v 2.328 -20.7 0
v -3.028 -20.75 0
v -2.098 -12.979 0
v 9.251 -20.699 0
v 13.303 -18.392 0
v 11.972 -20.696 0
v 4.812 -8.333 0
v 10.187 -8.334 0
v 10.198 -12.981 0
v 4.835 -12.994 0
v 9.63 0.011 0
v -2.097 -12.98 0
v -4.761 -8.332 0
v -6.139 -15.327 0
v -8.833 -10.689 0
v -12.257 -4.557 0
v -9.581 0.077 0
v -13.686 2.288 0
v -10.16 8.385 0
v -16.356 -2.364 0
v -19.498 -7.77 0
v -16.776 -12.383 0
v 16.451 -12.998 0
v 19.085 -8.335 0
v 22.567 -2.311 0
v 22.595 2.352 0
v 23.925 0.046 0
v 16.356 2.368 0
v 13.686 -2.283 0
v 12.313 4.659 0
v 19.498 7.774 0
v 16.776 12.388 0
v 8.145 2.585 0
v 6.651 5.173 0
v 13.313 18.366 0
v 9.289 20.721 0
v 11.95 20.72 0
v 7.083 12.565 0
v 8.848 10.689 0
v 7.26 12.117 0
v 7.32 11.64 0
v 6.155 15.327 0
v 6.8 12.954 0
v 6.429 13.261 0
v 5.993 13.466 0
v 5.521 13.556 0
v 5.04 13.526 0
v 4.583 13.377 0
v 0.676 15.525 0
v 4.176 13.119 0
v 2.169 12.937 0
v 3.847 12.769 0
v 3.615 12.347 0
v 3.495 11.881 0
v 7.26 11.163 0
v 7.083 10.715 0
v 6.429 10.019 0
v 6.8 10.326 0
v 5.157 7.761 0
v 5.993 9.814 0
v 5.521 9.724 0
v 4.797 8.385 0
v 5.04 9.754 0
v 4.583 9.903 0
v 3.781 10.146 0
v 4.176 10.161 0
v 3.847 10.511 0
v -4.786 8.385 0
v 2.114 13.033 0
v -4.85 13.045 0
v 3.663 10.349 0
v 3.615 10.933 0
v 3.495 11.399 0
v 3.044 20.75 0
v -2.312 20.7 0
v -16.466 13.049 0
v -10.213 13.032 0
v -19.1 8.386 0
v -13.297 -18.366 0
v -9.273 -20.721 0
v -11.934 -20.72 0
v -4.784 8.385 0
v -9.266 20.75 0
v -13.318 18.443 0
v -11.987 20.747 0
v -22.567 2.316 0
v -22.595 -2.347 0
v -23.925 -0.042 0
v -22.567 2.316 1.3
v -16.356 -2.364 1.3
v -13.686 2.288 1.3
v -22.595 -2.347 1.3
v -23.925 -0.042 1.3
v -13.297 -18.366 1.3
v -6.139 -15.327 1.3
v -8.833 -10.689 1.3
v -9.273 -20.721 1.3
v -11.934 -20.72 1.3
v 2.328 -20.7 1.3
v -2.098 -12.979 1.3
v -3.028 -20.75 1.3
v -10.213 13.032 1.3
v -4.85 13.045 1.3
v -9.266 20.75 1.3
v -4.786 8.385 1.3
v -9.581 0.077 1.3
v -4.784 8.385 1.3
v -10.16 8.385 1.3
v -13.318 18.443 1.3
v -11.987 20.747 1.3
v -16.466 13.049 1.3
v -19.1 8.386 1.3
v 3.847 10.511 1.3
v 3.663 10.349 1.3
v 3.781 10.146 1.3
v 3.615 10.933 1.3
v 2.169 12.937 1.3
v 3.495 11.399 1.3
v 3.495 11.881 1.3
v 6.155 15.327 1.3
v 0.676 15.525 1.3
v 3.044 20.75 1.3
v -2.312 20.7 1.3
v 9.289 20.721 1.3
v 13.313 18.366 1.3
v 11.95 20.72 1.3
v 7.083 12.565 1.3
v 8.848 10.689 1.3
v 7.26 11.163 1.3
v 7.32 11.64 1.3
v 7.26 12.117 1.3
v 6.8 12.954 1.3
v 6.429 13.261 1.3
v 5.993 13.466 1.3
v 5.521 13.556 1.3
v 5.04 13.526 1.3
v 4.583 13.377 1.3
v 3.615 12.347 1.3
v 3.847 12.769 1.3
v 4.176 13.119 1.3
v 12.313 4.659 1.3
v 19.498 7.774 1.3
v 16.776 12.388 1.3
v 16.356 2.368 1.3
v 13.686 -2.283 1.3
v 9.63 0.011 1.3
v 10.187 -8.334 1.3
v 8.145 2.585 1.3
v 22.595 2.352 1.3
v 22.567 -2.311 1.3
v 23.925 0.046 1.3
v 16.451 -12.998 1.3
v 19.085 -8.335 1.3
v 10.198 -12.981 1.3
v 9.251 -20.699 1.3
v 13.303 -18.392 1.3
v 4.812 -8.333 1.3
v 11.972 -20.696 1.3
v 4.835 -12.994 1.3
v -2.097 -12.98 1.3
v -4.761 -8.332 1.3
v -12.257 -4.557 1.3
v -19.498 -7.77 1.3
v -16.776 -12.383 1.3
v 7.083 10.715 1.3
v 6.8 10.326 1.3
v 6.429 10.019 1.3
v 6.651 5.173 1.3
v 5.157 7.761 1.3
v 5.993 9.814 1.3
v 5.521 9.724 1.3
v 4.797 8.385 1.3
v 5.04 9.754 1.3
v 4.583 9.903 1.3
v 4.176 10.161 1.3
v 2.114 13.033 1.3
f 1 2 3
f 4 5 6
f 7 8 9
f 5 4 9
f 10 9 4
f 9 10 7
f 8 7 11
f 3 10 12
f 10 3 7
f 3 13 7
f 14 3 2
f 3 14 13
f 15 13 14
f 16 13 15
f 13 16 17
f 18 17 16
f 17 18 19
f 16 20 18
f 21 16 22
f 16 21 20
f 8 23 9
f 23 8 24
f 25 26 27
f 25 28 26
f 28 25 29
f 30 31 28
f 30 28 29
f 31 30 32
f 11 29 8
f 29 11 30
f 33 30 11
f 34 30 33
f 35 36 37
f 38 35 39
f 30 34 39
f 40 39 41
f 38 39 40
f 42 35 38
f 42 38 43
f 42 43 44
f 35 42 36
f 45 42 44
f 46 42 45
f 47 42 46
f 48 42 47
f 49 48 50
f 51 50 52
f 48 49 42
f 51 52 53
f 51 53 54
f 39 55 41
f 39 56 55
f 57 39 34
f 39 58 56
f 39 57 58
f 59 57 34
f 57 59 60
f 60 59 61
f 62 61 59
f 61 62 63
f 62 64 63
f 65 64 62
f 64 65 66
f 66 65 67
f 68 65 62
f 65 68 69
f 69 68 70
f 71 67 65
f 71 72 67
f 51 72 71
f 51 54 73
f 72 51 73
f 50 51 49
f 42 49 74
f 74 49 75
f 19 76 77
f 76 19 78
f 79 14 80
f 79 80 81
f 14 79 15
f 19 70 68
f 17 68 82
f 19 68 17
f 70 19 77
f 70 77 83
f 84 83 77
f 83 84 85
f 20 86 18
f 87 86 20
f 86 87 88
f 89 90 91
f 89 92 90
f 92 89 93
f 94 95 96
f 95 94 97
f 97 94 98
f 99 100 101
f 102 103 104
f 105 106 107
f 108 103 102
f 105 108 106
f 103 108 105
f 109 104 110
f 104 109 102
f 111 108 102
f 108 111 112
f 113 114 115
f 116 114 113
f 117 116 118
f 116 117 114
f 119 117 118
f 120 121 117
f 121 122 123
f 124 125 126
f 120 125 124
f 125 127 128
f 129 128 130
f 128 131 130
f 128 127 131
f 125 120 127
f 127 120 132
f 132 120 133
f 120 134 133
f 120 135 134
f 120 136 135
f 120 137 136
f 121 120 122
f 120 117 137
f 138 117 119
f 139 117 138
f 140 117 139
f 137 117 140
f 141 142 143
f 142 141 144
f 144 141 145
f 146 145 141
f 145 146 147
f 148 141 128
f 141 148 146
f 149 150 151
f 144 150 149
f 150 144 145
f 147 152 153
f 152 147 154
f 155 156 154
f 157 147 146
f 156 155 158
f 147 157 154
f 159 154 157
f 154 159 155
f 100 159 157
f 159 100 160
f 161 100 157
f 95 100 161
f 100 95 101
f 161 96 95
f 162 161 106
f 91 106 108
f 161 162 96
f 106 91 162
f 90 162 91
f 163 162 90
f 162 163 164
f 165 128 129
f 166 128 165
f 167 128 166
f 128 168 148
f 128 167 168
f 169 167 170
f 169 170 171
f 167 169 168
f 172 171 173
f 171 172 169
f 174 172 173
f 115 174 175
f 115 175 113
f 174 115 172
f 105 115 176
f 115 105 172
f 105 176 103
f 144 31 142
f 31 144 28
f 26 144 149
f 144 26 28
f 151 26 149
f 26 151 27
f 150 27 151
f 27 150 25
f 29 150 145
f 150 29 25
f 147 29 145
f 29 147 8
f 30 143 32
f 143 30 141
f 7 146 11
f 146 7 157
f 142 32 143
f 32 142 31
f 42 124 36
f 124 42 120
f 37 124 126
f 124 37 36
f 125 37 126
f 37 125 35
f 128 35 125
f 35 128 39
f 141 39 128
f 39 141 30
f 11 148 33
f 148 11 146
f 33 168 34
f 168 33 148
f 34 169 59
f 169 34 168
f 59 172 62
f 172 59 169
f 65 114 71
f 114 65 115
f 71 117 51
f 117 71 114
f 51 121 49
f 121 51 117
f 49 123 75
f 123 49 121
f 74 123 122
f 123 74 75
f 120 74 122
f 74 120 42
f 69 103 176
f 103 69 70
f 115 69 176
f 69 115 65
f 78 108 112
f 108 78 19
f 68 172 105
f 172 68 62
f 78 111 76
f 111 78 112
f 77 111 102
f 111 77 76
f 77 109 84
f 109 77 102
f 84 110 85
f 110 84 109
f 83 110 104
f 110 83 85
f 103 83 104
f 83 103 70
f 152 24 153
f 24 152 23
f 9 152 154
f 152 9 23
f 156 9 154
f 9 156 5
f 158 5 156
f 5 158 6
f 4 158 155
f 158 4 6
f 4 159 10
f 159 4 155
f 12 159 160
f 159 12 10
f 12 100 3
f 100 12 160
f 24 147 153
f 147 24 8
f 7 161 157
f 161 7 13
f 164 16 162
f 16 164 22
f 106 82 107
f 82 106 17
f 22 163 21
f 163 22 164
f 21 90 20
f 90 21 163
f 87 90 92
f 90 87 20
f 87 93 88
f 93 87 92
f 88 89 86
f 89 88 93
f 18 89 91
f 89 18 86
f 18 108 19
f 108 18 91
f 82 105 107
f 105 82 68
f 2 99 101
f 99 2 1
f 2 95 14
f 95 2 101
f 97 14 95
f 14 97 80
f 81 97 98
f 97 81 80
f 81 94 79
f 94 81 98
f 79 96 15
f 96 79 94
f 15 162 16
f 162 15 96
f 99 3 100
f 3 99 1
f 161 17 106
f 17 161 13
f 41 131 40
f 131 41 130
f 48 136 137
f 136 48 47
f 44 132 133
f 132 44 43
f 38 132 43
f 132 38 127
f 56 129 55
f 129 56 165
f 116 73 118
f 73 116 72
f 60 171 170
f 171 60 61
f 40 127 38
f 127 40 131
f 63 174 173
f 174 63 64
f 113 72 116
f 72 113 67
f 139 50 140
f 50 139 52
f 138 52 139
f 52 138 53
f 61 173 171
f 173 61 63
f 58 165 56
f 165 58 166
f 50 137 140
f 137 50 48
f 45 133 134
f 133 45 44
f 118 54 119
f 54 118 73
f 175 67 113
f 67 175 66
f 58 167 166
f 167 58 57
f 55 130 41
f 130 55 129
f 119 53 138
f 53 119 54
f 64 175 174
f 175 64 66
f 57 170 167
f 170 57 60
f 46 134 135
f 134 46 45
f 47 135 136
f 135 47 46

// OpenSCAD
// Module names are of the form poly_<inkscape-path-id>().  As a result,
// you can associate a polygon in this OpenSCAD program with the corresponding
// SVG element in the Inkscape document by looking for the XML element with
// the attribute id="inkscape-path-id".

// fudge value is used to ensure that subtracted solids are a tad taller
// in the z dimension than the polygon being subtracted from.  This helps
// keep the resulting .stl file manifold.
fudge = 0.1;

resize = 1.2;
h = 1.3;
hole = 1.6;

module poly_use4877(h)
{
  scale([25.4/90, -25.4/90, 1]) union()
  {
    linear_extrude(height=h)
      polygon([[14.207302,24.606074],[49.535701,-36.577571],[57.571512,-22.955866],[48.295577,-6.991831],[66.717461,-6.943450],[70.643564,-0.136878],[66.634395,6.824948],[40.412750,6.742153],[30.078745,24.607594]]);
  }
}

module poly_use4867(h)
{
  scale([25.4/90, -25.4/90, 1]) union()
  {
    linear_extrude(height=h)
      polygon([[28.458722,0.008829],[24.048793,-7.633090],[19.638494,-15.274795],[15.227887,-22.916323],[10.817037,-30.557711],[6.406008,-38.198996],[1.994864,-45.840215],[-6.827516,-61.122604],[8.987139,-61.270958],[18.174426,-45.255754],[27.427286,-61.185376],[35.285004,-61.182278],[39.309521,-54.229323],[26.127003,-31.562097],[36.358720,-13.756949]]);
  }
}

module poly_use4875(h)
{
  scale([25.4/90, -25.4/90, 1]) union()
  {
    linear_extrude(height=h)
      polygon([[6.242489,-38.482132],[-14.321266,-38.519856],[-27.360264,-61.269896],[-35.393881,-61.261111],[-39.325426,-54.457909],[-30.156475,-38.479555],[-48.619947,-38.530715],[-56.398803,-24.761012],[14.165366,-24.757388],[6.242489,-38.482132]]);
  }
}

module poly_use4865(h)
{
  scale([25.4/90, -25.4/90, 1]) union()
  {
    linear_extrude(height=h)
      polygon([[-14.163043,24.603341],[56.353710,24.610099],[48.574866,38.380159],[30.111644,38.328989],[39.280671,54.306992],[35.349053,61.110382],[27.315368,61.119393],[14.276240,38.369401],[-6.191601,38.327891]]);
  }
}

module poly_use4863(h)
{
  scale([25.4/90, -25.4/90, 1]) union()
  {
    linear_extrude(height=h)
      polygon([[-14.126419,-24.758850],[-49.535698,36.564898],[-57.571510,22.943194],[-48.295574,6.979159],[-66.717461,6.930749],[-70.643564,0.124177],[-66.634393,-6.837620],[-40.412747,-6.754854],[-29.997860,-24.764369]]);
  }
}

module poly_path4861(h)
{
  scale([25.4/90, -25.4/90, 1]) union()
  {
    linear_extrude(height=h)
      polygon([[-28.291283,-0.227362],[6.874205,61.122604],[-8.940450,61.270958],[-18.127737,45.255754],[-27.380597,61.185376],[-35.238315,61.182278],[-39.262832,54.229323],[-26.080314,31.562097],[-36.191280,13.454298]]);
  }
}

$fn=25;
difference() {
    union() {
        scale([resize,resize,1]){
        poly_use4877(h);
        poly_use4867(h);
        poly_use4875(h);
        poly_use4865(h);
        poly_use4863(h);
        poly_path4861(h);
        }
    }
    translate([resize*4.5,resize*9.7,-0.1]) cylinder(h=h+0.2, r=resize*hole);
}
